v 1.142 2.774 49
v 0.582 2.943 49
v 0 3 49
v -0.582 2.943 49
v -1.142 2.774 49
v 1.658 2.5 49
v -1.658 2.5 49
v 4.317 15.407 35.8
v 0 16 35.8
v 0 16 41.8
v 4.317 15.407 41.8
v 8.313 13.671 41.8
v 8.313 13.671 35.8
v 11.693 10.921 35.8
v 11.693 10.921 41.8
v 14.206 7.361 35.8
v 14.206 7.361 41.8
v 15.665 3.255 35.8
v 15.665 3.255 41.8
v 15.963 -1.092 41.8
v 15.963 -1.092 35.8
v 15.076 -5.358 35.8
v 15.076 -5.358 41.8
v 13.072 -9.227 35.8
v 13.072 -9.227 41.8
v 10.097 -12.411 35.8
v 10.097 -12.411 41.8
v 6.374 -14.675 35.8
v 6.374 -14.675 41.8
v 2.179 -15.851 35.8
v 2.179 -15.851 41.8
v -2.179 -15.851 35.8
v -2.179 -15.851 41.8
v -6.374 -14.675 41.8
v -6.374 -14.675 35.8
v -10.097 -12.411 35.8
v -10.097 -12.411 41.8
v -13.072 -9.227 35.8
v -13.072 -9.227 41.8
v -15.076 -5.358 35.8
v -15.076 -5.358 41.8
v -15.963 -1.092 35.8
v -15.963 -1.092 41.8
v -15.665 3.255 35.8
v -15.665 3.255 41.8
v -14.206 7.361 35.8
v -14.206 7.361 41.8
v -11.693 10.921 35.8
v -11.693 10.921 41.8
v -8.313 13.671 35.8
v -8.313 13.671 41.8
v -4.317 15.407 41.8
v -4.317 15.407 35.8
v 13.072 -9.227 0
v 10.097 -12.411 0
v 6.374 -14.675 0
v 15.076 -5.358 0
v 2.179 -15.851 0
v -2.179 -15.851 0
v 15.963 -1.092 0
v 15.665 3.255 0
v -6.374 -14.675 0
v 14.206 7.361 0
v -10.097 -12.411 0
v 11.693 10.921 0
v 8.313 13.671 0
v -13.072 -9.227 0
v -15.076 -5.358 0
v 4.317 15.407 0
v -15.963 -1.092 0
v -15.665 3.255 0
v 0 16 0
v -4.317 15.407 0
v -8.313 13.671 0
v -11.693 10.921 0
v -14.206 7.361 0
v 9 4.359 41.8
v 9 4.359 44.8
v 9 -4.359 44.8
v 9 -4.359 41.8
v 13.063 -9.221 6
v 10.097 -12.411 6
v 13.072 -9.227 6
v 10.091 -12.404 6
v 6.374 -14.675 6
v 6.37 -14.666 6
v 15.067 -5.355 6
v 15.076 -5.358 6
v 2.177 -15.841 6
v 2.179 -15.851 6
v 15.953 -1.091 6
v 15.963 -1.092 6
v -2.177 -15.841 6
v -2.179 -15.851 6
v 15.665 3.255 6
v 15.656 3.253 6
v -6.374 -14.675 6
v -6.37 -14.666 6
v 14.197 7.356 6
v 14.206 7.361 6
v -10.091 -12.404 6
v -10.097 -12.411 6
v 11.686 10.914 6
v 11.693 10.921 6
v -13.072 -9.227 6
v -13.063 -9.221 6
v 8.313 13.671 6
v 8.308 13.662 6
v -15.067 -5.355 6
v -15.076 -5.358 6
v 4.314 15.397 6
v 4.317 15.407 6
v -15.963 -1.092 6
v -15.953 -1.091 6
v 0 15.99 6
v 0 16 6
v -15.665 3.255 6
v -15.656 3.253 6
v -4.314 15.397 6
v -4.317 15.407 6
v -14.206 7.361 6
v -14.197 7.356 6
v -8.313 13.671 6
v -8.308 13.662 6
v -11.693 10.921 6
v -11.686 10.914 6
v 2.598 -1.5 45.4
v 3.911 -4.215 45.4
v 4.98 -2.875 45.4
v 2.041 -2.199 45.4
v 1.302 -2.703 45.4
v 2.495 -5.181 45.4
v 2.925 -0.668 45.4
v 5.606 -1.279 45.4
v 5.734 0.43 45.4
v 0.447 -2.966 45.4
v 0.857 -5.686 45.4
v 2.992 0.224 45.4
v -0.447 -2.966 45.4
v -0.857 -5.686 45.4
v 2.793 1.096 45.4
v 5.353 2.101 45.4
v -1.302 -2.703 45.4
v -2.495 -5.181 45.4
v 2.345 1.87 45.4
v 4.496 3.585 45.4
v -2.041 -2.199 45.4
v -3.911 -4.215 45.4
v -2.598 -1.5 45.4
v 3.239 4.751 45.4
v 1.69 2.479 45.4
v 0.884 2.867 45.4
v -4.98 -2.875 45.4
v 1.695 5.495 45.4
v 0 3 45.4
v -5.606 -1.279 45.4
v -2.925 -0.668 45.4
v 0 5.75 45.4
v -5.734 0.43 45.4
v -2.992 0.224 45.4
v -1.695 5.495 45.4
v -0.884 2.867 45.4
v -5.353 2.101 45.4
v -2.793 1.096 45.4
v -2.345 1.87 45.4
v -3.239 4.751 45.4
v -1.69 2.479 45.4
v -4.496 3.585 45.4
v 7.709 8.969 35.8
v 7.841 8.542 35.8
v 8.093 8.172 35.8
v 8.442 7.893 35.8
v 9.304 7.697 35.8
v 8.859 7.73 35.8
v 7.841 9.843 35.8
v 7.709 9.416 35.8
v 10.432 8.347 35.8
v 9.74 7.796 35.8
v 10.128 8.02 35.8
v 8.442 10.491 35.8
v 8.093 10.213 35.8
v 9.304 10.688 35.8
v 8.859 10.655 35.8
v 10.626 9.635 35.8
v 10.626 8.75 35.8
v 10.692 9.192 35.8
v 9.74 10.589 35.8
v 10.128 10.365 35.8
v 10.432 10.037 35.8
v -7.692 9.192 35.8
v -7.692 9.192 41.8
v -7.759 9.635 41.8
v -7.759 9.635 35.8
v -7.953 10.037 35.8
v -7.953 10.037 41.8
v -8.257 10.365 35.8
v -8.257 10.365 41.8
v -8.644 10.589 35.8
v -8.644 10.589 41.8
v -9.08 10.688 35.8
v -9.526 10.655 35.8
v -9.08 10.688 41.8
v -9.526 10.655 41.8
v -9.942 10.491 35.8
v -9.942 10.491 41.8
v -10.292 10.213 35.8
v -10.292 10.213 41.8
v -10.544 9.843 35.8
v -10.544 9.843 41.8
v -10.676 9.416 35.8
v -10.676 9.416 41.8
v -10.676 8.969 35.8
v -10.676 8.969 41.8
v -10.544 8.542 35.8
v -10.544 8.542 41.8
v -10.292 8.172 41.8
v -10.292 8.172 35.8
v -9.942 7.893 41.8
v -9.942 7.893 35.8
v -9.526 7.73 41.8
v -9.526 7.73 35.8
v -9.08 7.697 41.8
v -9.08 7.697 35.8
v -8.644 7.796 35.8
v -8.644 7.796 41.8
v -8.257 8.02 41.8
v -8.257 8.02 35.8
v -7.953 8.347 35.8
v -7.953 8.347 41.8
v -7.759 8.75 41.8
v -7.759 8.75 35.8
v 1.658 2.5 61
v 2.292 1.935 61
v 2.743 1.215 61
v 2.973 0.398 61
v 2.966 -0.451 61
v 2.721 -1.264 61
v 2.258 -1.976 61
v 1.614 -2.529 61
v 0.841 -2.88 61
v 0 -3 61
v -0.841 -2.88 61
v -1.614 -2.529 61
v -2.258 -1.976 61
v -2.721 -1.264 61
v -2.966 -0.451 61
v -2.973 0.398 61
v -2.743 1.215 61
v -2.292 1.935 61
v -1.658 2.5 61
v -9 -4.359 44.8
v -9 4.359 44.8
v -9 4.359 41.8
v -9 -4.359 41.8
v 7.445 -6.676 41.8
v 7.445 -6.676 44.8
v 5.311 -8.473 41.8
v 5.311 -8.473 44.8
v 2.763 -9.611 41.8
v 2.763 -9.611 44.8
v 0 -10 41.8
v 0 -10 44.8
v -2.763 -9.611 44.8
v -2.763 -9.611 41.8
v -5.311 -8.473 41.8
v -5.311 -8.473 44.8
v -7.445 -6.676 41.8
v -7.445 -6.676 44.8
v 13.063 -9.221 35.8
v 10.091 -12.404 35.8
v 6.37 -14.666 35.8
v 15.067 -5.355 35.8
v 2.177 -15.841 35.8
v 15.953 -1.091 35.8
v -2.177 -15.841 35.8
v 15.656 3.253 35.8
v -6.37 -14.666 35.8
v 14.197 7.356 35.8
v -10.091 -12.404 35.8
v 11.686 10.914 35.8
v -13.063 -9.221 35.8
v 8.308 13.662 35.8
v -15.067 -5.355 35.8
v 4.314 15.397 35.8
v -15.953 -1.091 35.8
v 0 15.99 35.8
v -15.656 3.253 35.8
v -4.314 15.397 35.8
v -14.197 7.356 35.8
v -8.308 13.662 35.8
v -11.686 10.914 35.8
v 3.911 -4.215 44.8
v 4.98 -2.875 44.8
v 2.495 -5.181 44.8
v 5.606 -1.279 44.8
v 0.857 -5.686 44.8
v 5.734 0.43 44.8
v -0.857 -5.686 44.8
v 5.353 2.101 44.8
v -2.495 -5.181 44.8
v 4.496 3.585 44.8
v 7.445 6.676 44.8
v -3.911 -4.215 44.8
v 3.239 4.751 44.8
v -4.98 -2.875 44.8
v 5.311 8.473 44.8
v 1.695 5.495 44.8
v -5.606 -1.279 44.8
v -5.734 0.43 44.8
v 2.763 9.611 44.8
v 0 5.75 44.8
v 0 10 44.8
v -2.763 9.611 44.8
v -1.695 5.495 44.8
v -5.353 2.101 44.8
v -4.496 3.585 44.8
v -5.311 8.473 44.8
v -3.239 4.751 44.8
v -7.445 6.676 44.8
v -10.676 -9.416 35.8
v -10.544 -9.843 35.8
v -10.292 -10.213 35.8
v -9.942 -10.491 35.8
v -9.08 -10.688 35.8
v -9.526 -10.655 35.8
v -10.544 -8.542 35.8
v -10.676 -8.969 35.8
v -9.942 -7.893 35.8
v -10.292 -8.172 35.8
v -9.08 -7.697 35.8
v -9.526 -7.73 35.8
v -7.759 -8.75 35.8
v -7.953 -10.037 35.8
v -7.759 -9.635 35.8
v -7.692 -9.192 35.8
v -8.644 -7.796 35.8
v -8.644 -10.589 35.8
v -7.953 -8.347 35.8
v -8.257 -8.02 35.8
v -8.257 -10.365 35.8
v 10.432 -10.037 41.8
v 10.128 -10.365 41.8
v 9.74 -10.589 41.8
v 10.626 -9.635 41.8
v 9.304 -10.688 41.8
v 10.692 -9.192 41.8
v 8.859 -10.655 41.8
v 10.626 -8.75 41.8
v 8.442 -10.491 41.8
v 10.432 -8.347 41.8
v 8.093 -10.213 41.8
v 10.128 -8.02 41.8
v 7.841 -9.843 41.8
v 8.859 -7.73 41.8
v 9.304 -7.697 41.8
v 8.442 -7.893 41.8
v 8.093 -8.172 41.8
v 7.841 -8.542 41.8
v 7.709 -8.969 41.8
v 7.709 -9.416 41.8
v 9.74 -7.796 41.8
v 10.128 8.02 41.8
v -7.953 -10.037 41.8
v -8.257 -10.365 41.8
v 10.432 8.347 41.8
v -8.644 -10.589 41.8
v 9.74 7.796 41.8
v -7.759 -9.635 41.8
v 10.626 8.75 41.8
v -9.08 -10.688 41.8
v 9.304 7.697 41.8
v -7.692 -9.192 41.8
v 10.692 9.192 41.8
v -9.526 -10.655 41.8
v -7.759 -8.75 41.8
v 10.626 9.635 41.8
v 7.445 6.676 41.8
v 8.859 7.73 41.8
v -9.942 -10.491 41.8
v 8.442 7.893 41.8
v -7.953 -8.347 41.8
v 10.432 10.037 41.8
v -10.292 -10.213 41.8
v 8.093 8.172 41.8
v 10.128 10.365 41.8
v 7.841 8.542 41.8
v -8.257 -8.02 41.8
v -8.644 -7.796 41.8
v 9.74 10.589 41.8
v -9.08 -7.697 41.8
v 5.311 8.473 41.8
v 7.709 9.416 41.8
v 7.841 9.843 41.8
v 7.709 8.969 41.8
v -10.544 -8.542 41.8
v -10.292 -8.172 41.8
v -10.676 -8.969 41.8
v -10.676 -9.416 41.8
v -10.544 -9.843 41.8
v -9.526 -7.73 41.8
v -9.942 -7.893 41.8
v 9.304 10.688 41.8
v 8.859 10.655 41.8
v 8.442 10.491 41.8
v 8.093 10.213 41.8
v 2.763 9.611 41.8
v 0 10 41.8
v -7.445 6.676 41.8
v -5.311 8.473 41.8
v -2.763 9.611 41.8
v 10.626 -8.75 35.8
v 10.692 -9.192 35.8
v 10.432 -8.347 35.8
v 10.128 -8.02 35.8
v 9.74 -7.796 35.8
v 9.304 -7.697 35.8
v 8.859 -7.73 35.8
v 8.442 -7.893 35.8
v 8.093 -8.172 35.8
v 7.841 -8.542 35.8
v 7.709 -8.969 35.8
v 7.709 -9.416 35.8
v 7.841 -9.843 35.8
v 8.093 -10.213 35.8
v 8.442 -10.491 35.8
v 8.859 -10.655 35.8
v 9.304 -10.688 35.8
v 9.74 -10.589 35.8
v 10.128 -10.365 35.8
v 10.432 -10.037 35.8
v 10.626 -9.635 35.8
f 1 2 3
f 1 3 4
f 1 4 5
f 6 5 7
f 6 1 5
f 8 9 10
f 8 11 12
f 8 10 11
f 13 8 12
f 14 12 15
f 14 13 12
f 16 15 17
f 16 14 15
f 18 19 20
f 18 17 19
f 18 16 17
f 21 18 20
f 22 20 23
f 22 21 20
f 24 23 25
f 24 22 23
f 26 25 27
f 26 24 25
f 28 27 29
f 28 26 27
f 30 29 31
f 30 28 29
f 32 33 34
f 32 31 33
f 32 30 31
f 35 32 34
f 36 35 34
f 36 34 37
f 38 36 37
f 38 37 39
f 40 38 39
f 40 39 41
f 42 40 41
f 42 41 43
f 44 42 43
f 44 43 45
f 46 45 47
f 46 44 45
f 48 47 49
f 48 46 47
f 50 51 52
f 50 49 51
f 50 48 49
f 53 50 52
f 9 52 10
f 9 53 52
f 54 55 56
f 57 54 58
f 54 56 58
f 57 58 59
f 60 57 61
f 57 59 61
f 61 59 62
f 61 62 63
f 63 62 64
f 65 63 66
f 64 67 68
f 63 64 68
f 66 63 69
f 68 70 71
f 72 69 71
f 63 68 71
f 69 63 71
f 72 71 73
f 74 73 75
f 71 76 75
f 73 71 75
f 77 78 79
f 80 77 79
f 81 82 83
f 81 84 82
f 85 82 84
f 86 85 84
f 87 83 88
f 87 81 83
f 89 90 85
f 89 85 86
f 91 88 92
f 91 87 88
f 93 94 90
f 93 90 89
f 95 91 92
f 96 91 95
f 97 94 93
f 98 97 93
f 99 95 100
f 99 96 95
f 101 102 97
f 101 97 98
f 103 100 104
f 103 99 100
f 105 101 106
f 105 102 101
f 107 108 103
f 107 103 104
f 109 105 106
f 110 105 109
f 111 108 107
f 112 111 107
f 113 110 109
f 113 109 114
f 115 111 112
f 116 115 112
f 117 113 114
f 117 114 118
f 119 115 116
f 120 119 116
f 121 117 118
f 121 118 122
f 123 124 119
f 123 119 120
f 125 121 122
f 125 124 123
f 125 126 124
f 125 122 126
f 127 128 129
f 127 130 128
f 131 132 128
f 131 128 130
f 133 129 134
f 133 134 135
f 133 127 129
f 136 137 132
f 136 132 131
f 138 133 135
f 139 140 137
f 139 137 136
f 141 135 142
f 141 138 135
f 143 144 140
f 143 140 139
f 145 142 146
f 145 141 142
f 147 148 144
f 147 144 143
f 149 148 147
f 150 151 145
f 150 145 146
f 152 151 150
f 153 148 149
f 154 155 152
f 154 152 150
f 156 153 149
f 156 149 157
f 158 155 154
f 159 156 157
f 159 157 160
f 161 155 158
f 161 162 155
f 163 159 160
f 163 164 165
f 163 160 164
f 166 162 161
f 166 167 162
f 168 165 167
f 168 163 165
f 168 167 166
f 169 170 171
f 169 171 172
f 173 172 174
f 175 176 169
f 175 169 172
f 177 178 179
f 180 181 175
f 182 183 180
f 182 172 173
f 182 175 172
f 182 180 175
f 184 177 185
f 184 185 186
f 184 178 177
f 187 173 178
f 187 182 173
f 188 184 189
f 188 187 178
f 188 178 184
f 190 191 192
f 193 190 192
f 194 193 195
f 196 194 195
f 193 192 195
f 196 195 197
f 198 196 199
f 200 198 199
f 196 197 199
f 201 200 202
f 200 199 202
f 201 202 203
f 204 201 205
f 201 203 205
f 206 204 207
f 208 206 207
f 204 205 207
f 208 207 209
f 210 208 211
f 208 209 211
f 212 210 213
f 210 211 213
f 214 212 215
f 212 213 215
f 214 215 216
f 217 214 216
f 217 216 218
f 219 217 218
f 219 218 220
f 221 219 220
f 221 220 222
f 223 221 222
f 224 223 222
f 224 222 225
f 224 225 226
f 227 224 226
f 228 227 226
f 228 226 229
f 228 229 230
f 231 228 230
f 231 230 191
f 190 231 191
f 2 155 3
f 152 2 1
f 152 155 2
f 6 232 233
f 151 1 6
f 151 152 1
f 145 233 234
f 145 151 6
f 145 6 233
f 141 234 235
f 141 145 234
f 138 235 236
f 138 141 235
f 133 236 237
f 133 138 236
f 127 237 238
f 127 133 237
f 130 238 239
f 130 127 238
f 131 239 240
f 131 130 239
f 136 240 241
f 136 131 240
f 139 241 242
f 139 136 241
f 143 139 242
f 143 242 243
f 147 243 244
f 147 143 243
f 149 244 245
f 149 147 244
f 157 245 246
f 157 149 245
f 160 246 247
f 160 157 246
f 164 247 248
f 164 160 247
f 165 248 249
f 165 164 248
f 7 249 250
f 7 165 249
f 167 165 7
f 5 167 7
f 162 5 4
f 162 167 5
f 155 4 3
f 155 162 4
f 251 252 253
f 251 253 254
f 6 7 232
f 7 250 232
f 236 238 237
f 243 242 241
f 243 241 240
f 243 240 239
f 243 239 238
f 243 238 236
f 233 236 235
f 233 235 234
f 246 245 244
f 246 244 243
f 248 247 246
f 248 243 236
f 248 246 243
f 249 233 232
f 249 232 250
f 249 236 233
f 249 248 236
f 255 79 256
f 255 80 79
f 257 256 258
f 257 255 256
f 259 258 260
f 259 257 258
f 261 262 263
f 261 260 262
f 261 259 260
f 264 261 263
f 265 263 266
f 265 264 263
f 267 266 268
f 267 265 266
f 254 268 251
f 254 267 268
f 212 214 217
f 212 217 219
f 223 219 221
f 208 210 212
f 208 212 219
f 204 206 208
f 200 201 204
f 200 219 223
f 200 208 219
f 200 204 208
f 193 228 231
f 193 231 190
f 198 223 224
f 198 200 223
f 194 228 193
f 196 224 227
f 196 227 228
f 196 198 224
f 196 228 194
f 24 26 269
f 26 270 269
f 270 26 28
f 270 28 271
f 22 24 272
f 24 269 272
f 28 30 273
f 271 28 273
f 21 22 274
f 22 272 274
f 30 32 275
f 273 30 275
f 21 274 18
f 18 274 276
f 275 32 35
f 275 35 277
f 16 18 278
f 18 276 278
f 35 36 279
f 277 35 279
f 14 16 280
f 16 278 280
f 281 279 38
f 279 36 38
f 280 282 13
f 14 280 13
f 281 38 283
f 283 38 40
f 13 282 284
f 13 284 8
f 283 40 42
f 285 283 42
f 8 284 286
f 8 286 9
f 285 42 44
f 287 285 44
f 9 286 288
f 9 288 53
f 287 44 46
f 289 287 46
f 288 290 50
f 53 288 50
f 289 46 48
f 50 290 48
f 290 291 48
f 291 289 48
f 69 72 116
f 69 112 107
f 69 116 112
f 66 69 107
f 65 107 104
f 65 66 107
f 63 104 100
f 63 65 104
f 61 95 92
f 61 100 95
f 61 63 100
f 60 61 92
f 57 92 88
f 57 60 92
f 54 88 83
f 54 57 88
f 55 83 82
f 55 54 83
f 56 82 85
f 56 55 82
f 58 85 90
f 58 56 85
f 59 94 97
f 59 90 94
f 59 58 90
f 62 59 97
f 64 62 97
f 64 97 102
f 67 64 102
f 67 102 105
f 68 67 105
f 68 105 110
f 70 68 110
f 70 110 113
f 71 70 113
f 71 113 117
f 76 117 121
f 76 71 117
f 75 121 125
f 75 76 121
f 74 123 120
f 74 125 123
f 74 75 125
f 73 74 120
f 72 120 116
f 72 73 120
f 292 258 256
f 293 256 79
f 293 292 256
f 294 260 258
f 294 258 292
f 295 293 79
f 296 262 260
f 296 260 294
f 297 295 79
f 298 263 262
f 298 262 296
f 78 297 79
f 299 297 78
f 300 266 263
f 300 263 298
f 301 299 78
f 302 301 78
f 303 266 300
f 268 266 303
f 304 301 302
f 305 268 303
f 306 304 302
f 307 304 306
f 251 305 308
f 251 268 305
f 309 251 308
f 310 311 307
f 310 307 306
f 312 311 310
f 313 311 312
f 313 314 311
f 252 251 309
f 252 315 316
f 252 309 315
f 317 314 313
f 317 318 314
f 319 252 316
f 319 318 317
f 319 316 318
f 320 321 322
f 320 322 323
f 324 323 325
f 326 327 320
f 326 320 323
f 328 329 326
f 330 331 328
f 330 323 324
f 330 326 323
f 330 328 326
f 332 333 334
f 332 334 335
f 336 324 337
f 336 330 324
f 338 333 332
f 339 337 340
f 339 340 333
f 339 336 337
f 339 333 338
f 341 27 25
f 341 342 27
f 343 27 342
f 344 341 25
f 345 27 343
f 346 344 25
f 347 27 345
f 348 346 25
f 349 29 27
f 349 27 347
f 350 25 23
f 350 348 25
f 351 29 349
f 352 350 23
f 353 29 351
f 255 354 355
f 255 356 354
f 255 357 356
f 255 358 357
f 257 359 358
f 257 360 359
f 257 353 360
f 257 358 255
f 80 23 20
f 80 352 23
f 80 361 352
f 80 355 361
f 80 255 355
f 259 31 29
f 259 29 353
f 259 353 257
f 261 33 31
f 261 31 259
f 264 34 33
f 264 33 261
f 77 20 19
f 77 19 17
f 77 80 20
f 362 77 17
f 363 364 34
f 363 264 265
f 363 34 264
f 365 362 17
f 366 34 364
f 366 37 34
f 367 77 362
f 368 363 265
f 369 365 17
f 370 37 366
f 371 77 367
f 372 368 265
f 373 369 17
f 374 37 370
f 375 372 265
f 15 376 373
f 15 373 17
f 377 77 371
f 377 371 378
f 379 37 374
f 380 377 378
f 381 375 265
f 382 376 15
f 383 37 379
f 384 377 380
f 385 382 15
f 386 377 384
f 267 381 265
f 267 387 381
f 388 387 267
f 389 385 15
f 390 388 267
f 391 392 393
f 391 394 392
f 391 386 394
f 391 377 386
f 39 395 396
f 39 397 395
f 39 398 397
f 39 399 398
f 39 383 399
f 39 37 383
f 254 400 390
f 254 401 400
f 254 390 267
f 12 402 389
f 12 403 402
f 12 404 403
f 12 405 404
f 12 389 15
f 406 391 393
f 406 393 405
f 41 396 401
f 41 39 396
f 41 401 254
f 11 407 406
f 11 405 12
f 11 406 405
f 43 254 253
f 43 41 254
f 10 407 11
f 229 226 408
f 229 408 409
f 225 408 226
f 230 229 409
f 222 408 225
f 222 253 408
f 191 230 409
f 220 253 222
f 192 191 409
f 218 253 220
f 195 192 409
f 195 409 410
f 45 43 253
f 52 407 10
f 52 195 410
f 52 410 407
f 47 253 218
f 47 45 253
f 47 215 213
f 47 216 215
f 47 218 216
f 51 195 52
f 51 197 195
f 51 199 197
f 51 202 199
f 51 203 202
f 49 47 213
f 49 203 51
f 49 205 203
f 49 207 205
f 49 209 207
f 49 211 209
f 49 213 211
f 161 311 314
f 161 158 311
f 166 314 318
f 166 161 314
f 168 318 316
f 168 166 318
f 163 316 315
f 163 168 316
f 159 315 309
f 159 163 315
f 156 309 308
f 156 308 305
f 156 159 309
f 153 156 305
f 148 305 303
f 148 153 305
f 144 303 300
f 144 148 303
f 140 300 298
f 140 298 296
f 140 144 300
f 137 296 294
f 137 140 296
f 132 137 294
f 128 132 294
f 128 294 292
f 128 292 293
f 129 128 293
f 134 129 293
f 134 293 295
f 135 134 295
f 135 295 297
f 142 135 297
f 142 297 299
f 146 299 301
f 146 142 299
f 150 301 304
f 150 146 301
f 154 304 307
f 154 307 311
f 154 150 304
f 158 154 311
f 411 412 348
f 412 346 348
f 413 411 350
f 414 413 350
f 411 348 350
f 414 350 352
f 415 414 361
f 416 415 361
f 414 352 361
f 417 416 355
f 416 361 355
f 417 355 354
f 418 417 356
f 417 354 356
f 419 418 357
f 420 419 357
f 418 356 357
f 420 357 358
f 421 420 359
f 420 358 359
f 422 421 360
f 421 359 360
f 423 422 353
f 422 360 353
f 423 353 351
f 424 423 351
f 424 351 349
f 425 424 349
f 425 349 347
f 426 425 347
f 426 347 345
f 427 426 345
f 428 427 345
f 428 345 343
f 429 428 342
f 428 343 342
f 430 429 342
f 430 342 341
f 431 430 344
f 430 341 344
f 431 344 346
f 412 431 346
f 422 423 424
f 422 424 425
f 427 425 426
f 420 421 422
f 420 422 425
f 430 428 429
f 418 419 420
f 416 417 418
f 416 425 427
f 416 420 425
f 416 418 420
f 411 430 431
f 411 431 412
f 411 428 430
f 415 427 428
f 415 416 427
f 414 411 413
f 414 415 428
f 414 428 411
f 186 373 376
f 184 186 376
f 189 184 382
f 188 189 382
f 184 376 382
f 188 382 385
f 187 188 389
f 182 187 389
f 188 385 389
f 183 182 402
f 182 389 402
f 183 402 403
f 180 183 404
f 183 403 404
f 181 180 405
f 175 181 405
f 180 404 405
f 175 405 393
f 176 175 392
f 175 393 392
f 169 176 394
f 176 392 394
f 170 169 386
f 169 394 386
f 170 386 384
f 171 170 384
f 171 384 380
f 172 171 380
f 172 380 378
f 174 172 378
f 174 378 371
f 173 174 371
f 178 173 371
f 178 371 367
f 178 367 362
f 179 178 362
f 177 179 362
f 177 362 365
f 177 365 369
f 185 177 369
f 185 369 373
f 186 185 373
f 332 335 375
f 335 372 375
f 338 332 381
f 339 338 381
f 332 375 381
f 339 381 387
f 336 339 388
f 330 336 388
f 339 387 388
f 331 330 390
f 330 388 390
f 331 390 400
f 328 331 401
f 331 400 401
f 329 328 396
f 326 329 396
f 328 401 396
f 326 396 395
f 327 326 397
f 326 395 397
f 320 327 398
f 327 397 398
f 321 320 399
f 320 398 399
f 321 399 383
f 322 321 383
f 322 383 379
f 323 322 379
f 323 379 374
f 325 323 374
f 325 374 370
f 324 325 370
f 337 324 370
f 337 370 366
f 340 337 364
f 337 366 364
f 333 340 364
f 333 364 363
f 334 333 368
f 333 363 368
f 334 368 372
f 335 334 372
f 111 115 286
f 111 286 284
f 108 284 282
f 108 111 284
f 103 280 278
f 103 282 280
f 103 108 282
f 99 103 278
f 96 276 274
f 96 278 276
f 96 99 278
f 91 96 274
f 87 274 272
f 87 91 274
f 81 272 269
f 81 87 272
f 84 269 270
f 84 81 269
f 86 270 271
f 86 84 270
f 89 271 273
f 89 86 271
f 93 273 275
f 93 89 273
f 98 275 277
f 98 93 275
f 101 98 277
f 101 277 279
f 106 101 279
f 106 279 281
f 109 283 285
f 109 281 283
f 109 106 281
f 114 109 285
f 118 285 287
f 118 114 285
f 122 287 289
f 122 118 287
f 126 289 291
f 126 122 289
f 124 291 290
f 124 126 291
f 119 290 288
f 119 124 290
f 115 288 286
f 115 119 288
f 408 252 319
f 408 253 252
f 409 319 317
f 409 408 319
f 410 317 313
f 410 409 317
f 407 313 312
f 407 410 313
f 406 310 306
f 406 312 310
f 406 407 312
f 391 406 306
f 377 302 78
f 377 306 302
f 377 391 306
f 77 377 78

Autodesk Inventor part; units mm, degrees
ref_plane "YZ Plane" through (0, 0, 0) normal (1, 0, 0) x (0, 1, 0)
ref_plane "XZ Plane" through (0, 0, 0) normal (0, 1, 0) x (-1, 0, 0)
ref_plane "XY Plane" through (0, 0, 0) normal (0, 0, 1) x (1, 0, 0)
sketch "Sketch1" plane through (0, 0, 0) normal (1, 0, 0) x (0, 1, 0)
  line L0 (0, 61) -> (3, 61)
  line L1 (3, 61) -> (3, 44.8)
  line L2 (3, 44.8) -> (10, 44.8)
  line L3 (10, 44.8) -> (10, 41.8)
  line L4 (10, 41.8) -> (16, 41.8)
  line L5 (16, 41.8) -> (16, 35.8)
  line L6 (16, 35.8) -> (15.99, 35.8)
  line L7 (15.99, 35.8) -> (15.99, 6)
  line L8 (15.99, 6) -> (16, 6)
  line L9 (16, 6) -> (16, 0)
  line L10 (16, 0) -> (0, 0)
  line L11 (0, 0) -> (0, 61)
  line L12 (5.75, 45.4) -> (3, 45.4)
  line L13 (3, 45.4) -> (3, 44.8)
  line L14 (3, 44.8) -> (5.75, 44.8)
  line L15 (5.75, 44.8) -> (5.75, 45.4)
  point P0 (1.5, 61)
  dimension "d0" = 6
  dimension "d1" = 32
  dimension "d2" = 6
  dimension "d3" = 19.2
  dimension "d4" = 41.8
  dimension "d5" = 3
  dimension "d6" = 20
  dimension "d7" = 0.01
  dimension "d24" = 0.6
  dimension "d25" = 11.5
revolve "Revolution1" add sketch "Sketch1" angle 360 about axis through (0, 0, 0) along (0, 0, 1)
sketch "Sketch2" plane through (0, 0, 61) normal (0, 0, 1) x (1, 0, 0)
  arc A0 (1.6583, 2.5) -> (-1.6583, 2.5) centre (0, 0) ccw
  line L0 (-1.6583, 2.5) -> (1.6583, 2.5)
  circle A1 centre (0, 0) radius 3 projected
  dimension "d9" = 2.5
extrude "Extrusion1" cut sketch "Sketch2" against normal blind 12 contours L0 A0
sketch "Sketch3" plane through (0, 0, 44.8) normal (0, 0, 1) x (1, 0, 0)
  line L0 (-9, 4.3589) -> (-9, -4.3589)
  line L1 (9, 4.3589) -> (9, -4.3589)
  arc A0 (-9, 4.3589) -> (-9, -4.3589) centre (0, 0) ccw
  arc A1 (9, -4.3589) -> (9, 4.3589) centre (0, 0) ccw
  circle A2 centre (0, 0) radius 10 construction
  dimension "d12" = 18
extrude "Extrusion2" cut sketch "Sketch3" against normal up to surface (3 mm away)
sketch "Sketch4" plane through (0, 0, 41.8) normal (0, 0, 1) x (1, 0, 0)
  line L0 (0, 0) -> (-9.1924, 9.1924) construction
  circle A0 centre (-9.1924, 9.1924) radius 1.5
  line L1 (0, 0) -> (-13, 0) construction
  circle A1 centre (-9.1924, -9.1924) radius 1.5
  circle A2 centre (9.1924, -9.1924) radius 1.5
  circle A3 centre (9.1924, 9.1924) radius 1.5
  dimension "d15" = 3
  dimension "d16" = 13
  dimension "d17" = 45
  dimension "d20" = 360
extrude "Extrusion3" cut sketch "Sketch4" against normal blind 6
properties part number "PlanetaryGearbox"
